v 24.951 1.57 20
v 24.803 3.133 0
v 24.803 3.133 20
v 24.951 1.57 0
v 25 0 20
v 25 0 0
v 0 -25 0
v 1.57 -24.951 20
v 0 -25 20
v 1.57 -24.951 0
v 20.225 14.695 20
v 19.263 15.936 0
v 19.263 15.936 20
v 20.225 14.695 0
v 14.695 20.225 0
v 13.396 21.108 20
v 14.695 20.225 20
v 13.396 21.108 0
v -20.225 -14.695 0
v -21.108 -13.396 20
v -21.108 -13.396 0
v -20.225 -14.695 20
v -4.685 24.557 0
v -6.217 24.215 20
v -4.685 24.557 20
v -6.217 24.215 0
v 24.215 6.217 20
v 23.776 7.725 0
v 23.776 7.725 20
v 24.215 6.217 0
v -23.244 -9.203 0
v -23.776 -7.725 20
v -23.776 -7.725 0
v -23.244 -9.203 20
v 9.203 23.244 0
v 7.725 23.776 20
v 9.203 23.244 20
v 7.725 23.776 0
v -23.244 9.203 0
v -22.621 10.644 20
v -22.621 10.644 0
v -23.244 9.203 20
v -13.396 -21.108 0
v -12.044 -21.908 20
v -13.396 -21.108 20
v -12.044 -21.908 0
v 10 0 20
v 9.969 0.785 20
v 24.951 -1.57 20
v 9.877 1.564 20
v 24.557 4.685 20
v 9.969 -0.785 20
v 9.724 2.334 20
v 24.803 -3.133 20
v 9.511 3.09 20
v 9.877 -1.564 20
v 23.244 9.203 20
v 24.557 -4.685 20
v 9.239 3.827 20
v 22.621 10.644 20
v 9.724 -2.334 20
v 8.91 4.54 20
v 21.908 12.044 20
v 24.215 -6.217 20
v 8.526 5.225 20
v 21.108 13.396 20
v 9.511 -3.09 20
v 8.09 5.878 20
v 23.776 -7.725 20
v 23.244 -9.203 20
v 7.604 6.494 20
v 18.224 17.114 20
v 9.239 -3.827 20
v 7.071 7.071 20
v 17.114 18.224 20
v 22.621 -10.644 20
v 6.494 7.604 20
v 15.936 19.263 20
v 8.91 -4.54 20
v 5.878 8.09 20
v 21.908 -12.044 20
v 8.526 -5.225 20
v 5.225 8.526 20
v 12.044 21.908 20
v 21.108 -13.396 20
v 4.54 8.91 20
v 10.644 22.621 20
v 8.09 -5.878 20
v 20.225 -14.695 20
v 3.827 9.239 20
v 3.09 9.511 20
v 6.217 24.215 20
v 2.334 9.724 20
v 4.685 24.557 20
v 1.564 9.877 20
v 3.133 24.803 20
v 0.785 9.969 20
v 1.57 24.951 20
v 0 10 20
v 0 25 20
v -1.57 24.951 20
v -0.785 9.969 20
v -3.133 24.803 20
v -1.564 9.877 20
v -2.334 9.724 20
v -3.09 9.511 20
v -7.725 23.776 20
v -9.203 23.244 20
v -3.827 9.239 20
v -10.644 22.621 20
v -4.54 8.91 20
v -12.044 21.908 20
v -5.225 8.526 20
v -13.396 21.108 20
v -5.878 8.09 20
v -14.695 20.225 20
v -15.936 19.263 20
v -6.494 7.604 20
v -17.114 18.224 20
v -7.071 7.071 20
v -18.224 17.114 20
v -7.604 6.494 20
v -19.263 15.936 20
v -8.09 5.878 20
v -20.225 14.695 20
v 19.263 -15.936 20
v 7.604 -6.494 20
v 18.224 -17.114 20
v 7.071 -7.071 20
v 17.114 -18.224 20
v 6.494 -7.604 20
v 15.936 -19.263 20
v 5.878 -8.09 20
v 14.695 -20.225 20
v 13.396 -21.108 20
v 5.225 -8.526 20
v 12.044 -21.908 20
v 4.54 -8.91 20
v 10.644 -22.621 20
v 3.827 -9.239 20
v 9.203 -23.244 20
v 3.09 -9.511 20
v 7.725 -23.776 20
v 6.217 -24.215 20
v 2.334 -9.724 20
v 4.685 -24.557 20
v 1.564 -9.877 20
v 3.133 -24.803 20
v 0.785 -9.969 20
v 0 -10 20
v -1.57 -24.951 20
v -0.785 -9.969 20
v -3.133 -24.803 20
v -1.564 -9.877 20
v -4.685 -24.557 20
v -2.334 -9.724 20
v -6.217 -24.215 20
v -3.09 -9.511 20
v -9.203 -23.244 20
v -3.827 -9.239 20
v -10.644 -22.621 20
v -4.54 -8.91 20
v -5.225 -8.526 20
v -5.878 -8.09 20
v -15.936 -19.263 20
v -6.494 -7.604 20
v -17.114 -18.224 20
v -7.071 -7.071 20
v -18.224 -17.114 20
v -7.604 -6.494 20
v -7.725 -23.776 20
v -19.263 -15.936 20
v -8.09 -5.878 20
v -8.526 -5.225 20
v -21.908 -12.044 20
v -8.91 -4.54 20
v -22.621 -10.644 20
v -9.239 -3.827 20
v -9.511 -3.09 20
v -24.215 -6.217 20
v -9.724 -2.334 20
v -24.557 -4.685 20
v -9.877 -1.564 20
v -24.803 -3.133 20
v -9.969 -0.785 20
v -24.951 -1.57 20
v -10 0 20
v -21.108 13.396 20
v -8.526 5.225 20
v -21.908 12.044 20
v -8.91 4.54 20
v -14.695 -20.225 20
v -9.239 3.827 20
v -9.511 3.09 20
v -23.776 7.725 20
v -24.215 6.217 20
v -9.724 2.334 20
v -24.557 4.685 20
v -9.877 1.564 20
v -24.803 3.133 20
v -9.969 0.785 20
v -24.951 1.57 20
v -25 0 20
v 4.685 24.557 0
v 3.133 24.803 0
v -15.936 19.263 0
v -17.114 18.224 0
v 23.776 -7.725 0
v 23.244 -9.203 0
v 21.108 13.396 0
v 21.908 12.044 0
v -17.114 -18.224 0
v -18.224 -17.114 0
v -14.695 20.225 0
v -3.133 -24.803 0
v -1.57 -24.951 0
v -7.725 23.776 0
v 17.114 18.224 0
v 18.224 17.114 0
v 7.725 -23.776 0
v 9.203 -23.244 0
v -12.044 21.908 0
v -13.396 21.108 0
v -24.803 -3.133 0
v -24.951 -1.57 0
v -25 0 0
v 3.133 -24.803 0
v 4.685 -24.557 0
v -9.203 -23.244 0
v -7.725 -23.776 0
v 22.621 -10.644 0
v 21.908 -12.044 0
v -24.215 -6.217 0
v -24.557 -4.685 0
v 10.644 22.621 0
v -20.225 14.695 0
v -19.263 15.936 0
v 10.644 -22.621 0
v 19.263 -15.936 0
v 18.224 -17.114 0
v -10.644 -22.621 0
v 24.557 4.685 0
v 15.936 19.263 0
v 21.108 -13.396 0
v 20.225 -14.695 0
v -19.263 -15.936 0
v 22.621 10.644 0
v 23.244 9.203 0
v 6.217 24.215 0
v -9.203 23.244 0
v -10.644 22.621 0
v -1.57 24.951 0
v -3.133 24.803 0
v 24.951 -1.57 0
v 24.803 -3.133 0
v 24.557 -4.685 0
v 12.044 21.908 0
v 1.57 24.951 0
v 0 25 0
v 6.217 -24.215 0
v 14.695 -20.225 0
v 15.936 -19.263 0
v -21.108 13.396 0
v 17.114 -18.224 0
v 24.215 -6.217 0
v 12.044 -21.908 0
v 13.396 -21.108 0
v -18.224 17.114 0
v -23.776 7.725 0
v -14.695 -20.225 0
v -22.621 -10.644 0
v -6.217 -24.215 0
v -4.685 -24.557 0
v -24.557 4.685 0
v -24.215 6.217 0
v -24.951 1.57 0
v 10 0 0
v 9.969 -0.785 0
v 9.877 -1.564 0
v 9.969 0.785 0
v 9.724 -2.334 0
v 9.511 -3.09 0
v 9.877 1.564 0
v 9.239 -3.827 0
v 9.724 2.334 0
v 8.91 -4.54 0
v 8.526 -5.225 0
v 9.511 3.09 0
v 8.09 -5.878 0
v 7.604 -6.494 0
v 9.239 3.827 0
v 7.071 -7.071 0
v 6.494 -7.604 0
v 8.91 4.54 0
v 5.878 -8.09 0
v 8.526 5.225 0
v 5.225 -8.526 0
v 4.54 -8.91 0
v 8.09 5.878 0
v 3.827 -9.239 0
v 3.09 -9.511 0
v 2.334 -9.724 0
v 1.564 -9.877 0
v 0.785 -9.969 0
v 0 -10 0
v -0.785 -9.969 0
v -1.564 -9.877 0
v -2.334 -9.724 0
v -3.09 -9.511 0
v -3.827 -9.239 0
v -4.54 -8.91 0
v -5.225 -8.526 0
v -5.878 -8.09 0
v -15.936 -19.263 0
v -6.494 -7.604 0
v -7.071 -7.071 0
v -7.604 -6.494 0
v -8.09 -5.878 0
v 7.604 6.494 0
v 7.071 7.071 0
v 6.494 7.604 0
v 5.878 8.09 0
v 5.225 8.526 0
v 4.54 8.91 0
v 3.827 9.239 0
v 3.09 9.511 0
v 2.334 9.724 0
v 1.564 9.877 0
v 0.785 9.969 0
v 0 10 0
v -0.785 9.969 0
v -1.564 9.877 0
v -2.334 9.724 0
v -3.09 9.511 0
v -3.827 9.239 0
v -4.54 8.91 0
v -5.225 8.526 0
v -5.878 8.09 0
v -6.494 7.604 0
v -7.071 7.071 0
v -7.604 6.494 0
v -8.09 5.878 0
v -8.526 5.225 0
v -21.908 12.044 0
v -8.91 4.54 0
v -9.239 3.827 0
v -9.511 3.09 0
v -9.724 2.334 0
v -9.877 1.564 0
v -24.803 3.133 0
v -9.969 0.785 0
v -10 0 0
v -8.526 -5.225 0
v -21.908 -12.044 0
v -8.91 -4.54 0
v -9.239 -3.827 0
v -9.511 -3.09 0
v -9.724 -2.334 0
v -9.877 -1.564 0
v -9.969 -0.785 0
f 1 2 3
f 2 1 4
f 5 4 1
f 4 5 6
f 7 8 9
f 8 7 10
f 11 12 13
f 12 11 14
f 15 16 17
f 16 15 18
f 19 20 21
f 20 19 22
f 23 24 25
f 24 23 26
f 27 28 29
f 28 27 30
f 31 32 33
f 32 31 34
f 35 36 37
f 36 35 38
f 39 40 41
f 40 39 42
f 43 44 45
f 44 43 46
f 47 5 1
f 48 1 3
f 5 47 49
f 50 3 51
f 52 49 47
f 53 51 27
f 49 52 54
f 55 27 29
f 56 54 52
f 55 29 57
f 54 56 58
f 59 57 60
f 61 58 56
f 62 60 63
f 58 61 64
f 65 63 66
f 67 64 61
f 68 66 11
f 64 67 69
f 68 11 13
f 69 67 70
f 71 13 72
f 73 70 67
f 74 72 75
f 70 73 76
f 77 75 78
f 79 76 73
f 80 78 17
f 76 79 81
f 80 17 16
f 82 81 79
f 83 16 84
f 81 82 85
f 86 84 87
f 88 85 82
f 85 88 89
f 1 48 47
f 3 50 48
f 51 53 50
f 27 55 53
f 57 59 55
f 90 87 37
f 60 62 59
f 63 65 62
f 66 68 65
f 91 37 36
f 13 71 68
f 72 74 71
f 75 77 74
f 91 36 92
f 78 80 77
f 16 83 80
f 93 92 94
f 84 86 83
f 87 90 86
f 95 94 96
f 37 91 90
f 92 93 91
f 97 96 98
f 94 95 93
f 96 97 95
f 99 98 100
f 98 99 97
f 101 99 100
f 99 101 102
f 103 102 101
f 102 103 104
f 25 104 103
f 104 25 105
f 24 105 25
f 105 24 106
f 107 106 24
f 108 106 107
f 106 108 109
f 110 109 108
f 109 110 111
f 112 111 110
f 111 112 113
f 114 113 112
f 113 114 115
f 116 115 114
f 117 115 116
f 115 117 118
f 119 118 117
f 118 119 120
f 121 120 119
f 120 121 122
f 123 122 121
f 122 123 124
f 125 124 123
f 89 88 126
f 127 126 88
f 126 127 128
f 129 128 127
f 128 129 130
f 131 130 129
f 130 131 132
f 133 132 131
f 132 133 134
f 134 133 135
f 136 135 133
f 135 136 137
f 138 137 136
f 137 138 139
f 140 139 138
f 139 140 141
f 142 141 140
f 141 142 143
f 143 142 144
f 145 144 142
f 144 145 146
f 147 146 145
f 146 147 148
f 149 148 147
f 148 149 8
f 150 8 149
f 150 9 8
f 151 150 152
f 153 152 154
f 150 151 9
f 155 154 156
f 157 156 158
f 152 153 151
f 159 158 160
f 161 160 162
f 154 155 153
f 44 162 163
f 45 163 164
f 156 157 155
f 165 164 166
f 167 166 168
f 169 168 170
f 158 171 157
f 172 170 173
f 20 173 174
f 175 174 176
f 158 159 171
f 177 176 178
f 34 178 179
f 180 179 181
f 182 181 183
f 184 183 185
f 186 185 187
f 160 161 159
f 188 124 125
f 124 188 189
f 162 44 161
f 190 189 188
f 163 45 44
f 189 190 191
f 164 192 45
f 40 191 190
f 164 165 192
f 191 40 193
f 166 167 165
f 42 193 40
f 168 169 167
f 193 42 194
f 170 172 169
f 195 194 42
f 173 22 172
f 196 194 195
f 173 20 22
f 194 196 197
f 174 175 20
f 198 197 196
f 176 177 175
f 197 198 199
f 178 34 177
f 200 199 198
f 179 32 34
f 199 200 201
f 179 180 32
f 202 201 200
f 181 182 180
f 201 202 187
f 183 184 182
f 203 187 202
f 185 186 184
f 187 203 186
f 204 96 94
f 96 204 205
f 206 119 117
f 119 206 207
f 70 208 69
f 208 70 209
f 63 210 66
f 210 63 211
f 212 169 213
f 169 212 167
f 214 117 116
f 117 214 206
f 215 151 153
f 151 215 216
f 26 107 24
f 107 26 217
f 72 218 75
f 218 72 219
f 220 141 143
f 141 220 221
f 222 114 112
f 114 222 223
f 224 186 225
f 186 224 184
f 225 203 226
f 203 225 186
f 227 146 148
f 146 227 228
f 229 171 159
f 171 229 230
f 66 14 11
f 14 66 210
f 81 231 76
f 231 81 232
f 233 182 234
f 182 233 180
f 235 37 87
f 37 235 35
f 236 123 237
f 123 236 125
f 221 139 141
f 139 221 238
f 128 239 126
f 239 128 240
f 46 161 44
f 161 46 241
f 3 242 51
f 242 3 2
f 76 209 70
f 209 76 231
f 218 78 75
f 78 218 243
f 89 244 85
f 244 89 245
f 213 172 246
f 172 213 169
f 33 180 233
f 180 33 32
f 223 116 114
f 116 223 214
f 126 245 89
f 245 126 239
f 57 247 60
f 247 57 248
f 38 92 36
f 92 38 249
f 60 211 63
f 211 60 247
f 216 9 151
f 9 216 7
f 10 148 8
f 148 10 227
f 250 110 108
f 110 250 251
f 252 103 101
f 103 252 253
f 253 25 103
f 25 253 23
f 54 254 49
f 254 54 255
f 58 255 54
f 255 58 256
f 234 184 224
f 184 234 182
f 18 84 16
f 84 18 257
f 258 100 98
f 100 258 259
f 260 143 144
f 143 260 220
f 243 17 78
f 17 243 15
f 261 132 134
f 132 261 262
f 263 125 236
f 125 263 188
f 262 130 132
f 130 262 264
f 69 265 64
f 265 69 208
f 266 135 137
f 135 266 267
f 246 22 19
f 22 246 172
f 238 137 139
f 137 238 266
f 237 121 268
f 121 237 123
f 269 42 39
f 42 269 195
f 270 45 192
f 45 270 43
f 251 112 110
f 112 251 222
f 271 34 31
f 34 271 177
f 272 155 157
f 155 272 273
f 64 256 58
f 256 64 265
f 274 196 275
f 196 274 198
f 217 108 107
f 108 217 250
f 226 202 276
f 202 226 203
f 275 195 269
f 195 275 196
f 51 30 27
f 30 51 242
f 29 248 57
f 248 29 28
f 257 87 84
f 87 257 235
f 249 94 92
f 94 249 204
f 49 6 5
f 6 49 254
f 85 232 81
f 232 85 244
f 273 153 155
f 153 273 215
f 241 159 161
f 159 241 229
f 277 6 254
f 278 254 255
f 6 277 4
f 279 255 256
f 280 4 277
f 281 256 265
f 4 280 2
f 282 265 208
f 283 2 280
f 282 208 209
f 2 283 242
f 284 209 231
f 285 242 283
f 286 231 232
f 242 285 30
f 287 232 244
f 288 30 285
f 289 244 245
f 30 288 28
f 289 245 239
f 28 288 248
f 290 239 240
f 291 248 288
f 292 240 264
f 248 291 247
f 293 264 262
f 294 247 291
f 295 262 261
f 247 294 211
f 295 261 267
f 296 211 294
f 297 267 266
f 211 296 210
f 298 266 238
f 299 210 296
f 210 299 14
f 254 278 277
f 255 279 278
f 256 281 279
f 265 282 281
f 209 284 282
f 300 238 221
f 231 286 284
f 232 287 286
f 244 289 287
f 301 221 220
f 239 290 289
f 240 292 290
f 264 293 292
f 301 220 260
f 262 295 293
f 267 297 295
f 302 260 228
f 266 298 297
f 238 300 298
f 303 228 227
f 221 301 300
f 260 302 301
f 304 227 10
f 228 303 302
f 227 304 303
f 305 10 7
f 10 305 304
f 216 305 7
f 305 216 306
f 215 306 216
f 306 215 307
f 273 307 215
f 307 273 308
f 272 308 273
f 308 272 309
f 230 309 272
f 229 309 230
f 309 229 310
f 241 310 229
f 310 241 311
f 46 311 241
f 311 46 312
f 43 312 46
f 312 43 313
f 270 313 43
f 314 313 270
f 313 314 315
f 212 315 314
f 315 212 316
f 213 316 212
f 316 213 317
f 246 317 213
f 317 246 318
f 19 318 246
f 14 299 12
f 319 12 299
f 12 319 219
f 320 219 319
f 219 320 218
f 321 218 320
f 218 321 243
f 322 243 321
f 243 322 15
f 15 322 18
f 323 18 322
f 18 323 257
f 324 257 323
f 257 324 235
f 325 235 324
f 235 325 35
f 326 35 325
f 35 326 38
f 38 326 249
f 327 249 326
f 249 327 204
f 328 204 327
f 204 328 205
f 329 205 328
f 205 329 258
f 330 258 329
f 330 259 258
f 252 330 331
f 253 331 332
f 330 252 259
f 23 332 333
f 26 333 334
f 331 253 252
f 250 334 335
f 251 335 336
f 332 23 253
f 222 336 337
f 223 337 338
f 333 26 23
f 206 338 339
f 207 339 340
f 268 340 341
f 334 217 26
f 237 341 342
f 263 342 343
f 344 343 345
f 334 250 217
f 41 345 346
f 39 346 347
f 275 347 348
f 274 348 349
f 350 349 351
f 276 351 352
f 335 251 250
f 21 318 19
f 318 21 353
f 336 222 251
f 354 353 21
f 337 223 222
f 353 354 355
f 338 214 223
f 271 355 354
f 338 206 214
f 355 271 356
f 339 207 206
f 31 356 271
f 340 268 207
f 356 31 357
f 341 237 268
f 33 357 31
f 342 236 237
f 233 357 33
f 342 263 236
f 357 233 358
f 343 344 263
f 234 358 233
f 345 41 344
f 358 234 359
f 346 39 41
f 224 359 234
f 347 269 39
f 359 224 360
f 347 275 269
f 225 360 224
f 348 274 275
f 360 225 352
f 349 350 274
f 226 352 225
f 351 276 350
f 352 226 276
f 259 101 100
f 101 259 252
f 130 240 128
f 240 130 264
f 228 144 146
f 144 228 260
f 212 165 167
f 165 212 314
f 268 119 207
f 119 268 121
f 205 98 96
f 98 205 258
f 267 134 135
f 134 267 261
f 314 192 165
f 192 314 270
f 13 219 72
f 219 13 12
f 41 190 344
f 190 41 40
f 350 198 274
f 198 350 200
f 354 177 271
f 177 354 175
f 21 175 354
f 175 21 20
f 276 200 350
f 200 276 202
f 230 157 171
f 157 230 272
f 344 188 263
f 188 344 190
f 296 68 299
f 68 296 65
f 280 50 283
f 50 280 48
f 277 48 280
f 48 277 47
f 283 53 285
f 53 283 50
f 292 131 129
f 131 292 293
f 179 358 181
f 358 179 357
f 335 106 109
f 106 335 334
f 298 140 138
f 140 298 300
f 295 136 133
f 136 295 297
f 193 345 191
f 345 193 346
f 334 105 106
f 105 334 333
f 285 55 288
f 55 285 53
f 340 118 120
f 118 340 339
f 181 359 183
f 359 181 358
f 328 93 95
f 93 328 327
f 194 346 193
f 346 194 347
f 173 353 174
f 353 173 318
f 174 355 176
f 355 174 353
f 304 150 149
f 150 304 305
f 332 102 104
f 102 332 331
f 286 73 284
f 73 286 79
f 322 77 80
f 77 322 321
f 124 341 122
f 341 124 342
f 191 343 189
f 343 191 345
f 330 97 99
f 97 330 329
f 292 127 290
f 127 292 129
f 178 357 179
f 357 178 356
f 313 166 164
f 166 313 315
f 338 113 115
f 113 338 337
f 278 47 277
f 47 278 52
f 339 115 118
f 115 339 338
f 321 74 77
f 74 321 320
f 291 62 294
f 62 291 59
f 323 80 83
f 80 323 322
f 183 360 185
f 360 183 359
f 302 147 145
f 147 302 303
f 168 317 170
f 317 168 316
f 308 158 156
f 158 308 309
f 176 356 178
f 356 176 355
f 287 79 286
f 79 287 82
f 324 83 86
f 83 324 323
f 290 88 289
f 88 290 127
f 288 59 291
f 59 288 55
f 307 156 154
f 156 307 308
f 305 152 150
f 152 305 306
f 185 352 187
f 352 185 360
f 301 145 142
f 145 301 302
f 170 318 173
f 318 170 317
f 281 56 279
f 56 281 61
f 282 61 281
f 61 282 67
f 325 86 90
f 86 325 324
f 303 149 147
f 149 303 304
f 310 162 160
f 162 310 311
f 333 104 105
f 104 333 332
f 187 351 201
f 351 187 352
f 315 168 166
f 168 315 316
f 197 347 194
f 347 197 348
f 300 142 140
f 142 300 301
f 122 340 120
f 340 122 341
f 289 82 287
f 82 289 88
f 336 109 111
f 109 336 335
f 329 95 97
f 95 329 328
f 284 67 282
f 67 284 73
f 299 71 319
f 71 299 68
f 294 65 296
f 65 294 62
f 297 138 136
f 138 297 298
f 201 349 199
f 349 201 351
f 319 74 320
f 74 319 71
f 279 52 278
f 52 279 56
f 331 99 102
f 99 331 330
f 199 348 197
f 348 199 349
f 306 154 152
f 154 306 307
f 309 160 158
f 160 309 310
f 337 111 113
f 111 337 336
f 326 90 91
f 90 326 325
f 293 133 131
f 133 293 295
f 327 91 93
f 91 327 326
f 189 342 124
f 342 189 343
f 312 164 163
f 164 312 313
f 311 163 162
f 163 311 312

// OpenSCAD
grosor =20;
diametro=50;
diam_eje=20;


// construccion de larueda simple apartir de los parametros
difference(){
    //base de la rueda
    cylinder(r=diametro/2,h=grosor,$fn=100);
    //taladro
    cylinder(r=diam_eje/2,h=3*grosor,$fn=80,center=true);
}
